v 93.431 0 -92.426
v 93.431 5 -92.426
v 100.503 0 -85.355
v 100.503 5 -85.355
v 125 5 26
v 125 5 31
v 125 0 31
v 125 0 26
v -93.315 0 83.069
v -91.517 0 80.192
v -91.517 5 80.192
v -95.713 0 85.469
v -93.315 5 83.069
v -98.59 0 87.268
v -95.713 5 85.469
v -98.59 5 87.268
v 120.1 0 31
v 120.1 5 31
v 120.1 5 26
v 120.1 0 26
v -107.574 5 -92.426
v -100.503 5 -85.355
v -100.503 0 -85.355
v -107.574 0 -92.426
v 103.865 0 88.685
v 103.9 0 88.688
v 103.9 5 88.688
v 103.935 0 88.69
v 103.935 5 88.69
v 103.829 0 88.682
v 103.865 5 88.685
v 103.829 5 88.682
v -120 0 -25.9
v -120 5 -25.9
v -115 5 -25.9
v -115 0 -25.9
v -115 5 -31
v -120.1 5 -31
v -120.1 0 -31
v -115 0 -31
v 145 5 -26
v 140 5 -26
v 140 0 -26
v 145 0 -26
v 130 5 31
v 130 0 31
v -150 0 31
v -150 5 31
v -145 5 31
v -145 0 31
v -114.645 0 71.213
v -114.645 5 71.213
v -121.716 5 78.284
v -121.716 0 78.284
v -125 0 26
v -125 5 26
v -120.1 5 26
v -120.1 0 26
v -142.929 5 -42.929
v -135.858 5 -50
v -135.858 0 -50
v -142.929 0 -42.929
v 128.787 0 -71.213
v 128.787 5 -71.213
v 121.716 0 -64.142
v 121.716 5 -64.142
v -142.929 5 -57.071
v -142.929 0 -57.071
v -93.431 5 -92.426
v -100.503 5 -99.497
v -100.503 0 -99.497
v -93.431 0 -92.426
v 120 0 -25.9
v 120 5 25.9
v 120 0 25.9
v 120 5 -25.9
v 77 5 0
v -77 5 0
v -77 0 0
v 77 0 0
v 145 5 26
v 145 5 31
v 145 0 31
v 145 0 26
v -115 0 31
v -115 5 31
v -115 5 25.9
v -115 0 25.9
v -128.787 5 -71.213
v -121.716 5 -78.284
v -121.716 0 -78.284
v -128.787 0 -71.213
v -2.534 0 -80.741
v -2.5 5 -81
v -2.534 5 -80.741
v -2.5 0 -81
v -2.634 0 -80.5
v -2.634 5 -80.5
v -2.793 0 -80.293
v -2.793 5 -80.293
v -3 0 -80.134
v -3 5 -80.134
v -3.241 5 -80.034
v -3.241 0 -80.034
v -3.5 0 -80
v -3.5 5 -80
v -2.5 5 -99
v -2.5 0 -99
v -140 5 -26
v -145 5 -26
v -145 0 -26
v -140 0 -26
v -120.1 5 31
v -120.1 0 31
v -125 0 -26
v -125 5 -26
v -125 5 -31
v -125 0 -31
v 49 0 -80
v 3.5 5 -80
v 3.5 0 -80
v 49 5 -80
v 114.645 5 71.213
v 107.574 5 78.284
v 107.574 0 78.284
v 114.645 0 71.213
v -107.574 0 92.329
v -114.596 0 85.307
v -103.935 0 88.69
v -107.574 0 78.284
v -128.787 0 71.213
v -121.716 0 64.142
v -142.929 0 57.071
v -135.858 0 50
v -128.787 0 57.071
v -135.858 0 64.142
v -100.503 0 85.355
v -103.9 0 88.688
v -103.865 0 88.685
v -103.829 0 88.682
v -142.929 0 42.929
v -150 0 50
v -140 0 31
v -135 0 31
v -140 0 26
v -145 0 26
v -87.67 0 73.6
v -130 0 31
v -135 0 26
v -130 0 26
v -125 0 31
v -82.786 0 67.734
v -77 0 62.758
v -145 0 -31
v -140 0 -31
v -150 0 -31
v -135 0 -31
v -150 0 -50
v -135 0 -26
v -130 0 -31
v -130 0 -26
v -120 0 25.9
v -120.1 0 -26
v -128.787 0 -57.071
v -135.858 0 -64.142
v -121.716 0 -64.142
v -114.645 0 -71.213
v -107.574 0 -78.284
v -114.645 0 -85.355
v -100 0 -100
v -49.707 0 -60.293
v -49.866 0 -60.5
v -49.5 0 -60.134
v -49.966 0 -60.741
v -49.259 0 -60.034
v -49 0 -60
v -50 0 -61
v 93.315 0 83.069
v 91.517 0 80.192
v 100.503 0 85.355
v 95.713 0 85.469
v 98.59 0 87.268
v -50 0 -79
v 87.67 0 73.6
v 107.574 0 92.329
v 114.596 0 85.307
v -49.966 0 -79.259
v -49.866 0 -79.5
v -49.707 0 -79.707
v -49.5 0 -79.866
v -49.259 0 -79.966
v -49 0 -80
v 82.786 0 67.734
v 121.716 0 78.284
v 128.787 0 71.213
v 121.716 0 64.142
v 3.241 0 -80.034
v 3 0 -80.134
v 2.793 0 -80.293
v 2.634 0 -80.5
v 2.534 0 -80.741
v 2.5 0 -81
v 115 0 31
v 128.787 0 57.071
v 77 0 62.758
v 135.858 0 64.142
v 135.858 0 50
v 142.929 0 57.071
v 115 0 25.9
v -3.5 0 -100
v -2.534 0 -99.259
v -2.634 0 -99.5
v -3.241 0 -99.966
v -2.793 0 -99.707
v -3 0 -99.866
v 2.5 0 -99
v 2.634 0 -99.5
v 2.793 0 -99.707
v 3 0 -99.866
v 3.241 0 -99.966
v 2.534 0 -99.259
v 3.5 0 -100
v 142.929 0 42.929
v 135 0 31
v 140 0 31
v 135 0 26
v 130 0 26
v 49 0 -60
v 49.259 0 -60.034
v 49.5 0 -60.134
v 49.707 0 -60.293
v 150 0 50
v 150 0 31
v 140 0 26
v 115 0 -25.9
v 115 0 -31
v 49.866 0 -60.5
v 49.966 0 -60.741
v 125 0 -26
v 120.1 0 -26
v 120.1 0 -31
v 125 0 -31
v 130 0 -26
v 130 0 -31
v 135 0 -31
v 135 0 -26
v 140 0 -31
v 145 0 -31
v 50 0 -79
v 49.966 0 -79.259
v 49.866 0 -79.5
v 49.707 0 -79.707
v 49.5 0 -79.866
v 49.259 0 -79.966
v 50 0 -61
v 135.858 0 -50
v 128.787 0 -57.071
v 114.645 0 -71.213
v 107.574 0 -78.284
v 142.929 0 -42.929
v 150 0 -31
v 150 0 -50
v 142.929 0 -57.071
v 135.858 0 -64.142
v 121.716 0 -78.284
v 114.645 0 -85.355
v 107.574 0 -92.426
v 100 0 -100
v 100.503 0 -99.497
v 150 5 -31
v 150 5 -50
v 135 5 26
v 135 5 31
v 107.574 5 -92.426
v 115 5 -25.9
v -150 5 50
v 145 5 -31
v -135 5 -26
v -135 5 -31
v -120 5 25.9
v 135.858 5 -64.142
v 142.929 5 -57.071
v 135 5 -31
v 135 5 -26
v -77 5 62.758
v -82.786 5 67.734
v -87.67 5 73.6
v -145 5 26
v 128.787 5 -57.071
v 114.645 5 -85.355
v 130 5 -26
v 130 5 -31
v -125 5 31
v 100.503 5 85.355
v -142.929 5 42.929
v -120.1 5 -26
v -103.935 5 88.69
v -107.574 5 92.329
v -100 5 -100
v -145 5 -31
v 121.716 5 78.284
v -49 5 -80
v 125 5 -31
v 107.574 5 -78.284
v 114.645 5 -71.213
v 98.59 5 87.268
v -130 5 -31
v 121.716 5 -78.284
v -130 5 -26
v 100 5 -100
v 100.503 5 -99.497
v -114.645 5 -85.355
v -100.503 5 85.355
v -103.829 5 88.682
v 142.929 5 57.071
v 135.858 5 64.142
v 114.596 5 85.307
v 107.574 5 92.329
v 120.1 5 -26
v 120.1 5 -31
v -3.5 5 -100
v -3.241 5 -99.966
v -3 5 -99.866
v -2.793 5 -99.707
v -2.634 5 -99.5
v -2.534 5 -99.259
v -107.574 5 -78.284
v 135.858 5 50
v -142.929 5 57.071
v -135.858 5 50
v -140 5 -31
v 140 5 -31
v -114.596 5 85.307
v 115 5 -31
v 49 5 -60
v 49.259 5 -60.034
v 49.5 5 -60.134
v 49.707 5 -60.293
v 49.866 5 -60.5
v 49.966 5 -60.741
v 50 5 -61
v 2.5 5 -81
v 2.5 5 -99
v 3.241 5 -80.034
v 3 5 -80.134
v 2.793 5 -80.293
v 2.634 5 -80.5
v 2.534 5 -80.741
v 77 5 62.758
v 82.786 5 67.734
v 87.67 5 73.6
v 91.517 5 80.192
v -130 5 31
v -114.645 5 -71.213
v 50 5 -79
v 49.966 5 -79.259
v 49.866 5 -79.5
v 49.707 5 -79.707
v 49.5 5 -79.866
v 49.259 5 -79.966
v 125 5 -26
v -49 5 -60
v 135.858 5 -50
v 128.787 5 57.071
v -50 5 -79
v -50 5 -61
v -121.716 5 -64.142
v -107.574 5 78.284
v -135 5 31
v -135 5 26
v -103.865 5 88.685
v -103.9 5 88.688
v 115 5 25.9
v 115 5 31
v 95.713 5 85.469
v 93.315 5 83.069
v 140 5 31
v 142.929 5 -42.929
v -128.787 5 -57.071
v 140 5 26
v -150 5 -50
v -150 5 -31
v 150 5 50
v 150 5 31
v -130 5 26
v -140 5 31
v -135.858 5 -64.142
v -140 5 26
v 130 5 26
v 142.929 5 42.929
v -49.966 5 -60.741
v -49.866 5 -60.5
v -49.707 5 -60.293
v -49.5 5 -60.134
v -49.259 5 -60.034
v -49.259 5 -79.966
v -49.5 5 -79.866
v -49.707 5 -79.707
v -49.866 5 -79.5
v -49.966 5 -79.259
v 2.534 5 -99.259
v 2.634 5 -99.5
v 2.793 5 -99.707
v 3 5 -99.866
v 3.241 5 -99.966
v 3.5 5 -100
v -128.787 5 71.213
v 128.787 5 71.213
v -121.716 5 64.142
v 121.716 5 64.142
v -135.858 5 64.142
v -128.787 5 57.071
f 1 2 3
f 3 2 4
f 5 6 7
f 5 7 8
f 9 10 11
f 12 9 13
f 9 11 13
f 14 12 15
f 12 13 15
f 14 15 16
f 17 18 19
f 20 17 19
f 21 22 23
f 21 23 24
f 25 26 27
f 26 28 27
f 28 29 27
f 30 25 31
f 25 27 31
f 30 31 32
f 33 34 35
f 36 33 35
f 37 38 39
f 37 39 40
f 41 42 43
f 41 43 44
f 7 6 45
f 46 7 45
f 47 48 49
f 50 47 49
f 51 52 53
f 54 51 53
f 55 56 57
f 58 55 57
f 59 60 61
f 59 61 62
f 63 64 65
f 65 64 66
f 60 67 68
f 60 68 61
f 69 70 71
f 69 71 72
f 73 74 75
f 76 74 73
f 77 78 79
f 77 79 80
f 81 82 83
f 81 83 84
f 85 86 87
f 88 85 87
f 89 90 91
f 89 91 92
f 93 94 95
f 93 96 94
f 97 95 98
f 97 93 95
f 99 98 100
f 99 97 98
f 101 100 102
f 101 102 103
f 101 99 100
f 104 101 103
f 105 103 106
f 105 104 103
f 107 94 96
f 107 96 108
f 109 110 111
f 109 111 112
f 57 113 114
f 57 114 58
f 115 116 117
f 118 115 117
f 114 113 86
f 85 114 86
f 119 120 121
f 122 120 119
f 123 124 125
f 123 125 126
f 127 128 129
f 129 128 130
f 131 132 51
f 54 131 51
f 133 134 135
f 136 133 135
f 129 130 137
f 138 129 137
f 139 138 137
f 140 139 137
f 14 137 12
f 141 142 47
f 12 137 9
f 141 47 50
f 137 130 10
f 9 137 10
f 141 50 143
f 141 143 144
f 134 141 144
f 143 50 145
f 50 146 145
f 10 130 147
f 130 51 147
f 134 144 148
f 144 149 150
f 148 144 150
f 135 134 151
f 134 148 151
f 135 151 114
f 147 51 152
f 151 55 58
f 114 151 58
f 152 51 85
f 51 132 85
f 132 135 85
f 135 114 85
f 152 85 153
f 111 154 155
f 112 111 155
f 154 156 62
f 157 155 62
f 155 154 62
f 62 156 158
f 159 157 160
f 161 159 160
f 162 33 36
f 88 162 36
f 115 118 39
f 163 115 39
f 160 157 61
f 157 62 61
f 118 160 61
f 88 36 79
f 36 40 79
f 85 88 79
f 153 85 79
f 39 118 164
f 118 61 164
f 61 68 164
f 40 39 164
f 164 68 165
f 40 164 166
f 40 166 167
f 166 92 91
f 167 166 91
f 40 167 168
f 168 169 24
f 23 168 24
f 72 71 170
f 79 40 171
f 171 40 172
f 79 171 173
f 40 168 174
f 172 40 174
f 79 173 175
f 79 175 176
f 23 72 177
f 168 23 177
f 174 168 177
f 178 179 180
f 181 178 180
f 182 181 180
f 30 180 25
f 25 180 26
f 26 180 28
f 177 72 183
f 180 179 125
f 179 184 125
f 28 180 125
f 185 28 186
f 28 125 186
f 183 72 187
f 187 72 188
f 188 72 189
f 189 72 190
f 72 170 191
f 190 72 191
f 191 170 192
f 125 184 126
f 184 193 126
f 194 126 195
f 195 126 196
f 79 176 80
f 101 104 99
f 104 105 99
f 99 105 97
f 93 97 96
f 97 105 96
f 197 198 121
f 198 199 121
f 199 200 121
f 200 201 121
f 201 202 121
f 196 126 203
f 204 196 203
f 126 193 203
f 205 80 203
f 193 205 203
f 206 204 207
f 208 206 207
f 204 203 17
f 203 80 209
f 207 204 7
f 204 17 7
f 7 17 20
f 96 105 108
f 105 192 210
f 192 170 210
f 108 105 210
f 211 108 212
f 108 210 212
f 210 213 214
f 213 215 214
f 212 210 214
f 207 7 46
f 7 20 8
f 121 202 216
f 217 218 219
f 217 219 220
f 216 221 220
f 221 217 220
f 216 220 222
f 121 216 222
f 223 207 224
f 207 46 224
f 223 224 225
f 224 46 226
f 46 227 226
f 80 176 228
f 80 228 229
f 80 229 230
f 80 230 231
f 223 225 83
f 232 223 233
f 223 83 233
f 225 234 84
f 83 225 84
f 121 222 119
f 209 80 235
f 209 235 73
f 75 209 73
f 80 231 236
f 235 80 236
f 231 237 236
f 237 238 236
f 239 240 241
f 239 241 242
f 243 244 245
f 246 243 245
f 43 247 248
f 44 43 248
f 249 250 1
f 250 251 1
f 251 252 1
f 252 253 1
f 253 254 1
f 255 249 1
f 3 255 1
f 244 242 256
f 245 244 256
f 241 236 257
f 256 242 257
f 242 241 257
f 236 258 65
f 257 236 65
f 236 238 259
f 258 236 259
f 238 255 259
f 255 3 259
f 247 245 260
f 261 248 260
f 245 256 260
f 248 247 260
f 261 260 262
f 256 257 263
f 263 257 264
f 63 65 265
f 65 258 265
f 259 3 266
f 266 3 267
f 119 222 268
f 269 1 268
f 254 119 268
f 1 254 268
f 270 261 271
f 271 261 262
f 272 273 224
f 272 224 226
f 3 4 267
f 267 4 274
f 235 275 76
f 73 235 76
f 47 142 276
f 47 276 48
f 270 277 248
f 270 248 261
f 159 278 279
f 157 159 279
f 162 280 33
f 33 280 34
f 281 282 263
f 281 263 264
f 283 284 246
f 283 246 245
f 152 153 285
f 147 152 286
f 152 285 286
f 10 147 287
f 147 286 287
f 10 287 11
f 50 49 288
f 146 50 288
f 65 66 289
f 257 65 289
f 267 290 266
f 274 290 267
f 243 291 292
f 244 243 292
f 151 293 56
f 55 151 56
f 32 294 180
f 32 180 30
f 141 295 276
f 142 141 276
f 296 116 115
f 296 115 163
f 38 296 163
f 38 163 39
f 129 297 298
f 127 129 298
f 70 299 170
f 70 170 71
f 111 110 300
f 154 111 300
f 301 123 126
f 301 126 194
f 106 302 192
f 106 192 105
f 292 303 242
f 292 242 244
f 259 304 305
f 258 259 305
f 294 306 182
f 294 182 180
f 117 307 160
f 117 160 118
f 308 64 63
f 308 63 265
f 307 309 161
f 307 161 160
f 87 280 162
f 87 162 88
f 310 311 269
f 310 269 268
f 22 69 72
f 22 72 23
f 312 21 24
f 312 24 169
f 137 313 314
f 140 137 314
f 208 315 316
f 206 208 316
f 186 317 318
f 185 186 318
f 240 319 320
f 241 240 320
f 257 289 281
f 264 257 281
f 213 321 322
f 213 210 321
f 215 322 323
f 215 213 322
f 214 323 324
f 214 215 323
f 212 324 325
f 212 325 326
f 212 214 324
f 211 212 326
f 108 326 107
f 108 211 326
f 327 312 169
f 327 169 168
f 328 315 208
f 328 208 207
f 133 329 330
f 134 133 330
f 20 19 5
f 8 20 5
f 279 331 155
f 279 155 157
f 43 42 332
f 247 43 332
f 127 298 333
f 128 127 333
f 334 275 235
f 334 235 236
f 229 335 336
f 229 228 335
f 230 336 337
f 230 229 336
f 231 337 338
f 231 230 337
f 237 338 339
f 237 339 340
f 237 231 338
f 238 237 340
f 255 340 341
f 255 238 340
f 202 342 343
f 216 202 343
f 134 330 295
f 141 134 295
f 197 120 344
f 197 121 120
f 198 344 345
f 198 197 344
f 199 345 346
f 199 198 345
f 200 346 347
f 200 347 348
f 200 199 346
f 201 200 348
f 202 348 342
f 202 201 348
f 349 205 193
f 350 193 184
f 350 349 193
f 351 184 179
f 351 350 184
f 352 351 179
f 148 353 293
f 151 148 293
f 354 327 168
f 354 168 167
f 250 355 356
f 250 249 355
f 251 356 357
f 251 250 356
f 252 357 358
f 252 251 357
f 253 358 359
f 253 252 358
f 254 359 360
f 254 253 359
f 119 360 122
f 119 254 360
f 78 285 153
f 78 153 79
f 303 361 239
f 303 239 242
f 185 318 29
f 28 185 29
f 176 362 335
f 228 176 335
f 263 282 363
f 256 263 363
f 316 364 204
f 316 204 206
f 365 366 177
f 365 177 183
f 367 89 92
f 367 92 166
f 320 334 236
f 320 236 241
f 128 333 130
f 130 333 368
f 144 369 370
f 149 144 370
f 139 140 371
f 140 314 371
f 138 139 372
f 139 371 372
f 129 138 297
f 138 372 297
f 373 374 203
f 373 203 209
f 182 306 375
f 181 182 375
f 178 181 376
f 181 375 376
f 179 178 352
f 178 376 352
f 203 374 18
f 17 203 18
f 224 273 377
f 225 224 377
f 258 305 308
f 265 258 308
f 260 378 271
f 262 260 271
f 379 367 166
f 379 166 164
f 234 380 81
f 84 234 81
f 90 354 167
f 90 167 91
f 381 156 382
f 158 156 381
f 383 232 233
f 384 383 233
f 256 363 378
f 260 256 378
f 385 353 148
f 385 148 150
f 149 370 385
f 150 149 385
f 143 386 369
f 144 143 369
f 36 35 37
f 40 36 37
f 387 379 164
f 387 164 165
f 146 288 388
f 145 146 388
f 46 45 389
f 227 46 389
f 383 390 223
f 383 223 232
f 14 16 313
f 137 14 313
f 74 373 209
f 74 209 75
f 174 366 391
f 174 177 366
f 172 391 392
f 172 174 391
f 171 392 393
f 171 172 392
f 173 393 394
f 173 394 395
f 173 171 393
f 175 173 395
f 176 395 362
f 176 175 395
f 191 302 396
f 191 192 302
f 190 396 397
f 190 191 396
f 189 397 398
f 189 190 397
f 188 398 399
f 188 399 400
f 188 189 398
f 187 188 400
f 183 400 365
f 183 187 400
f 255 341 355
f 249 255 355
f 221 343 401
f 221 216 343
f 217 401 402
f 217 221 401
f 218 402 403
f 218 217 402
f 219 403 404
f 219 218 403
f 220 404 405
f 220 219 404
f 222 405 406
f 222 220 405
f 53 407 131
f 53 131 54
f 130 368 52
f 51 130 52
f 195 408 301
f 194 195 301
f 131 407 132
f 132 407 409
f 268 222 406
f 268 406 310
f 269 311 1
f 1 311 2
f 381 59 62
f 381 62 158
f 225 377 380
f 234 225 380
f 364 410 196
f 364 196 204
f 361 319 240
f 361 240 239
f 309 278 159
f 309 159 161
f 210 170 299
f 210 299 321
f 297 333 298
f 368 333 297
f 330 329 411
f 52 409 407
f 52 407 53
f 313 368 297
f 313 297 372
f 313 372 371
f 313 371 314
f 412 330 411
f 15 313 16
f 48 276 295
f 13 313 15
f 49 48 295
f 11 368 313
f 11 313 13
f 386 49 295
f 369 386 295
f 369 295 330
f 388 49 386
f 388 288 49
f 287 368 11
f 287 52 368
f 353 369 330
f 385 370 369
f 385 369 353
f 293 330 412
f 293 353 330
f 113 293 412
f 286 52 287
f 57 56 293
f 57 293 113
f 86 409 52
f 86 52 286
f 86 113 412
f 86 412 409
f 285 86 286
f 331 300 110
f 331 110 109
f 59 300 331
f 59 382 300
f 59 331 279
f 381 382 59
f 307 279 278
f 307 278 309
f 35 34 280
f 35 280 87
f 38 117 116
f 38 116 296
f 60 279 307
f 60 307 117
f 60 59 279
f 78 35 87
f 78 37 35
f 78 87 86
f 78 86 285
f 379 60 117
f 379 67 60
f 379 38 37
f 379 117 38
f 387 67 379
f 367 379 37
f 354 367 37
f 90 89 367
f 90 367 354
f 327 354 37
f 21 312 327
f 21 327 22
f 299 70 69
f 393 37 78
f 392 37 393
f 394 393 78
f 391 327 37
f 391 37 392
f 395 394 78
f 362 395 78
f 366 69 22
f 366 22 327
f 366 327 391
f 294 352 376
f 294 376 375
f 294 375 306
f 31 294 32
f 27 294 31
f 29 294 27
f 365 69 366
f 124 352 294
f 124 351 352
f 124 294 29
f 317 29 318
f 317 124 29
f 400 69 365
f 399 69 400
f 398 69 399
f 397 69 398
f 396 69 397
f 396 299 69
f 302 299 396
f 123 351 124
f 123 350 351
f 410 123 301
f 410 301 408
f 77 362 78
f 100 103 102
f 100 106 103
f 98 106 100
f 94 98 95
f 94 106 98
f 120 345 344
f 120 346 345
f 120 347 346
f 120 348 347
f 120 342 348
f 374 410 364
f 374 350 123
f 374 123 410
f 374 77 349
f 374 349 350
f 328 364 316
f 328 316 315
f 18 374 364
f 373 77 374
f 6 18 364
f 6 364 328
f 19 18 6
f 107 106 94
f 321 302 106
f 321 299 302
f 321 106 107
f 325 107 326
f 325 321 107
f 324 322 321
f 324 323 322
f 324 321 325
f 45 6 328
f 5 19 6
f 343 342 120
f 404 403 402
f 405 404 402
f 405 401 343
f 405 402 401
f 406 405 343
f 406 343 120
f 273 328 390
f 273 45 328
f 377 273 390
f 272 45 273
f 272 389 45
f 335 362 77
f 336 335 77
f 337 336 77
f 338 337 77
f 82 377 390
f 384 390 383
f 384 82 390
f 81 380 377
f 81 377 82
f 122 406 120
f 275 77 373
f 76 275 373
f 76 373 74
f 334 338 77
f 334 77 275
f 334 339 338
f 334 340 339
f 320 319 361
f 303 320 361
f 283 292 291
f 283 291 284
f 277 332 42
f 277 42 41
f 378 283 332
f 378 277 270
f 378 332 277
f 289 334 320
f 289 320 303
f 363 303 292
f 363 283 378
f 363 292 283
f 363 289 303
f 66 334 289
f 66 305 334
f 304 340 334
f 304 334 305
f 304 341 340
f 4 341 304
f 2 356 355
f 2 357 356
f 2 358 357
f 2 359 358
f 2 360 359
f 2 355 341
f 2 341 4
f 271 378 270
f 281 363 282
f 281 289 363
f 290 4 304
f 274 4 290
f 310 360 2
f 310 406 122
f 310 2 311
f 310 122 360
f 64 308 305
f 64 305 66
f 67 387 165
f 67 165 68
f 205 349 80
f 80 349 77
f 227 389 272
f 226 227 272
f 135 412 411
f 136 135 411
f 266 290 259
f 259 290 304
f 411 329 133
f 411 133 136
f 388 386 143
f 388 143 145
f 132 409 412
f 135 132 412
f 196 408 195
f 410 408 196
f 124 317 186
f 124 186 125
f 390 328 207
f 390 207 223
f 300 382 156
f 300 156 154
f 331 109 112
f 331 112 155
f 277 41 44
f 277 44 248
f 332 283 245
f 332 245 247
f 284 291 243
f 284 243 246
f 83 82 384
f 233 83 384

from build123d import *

# Parameters (mm, degrees)
ESQUISSE1_W                = 300
ESQUISSE1_H                = 200
BOSS_EXTRU_1_DEPTH         = 5
ENL_V_MAT_EXTRU_1_DEPTH    = 10
ESQUISSE10_R               = 46
ENL_V_MAT_EXTRU_9_DEPTH    = 10
CONG_2_R                   = 15
CONG_3_R                   = 15
ENL_V_MAT_EXTRU_10_DEPTH   = 10
R_P_TITION_LIN_AIRE1_COUNT = 4
R_P_TITION_LIN_AIRE1_PITCH = 20
SYM_TRIE3_COPY_1_DEPTH     = 10
SYM_TRIE3_COPY_2_DEPTH     = 10
SYM_TRIE3_COPY_3_DEPTH     = 10
SYM_TRIE4_COPY_1_DEPTH     = 10
SYM_TRIE4_COPY_2_DEPTH     = 10
SYM_TRIE4_COPY_3_DEPTH     = 10
SYM_TRIE4_COPY_4_DEPTH     = 10
SYM_TRIE4_COPY_5_DEPTH     = 10
SYM_TRIE4_COPY_6_DEPTH     = 10
SYM_TRIE4_COPY_7_DEPTH     = 10
ESQUISSE16_W               = 154
ESQUISSE16_H               = 100
ENL_V_MAT_EXTRU_15_DEPTH   = 10
ESQUISSE24_W               = 30
ESQUISSE24_H               = 52
ENL_V_MAT_EXTRU_18_DEPTH   = 10
ESQUISSE25_W               = 5.1
ESQUISSE25_H               = 5.1
ESQUISSE25_W_2             = 5
ENL_V_MAT_EXTRU_21_DEPTH   = 10
ESQUISSE26_W               = 100
ESQUISSE26_H               = 20
ENL_V_MAT_EXTRU_22_DEPTH   = 10
ESQUISSE27_W               = 5
ESQUISSE27_H               = 20
ENL_V_MAT_EXTRU_23_DEPTH   = 10
CONG_4_R                   = 1
BOSS_EXTRU_2_DEPTH         = 5


with BuildPart() as part:
    # Esquisse1 → Boss.-Extru.1 (new body)
    with BuildSketch(Plane(origin=(0, 0, 0), x_dir=(1, 0, 0), z_dir=(0, 1, 0))):
        Rectangle(ESQUISSE1_W, ESQUISSE1_H)
    extrude(amount=BOSS_EXTRU_1_DEPTH)

    # Esquisse2 → Enlèv. mat.-Extru.1 (cut)
    with BuildSketch(Plane(origin=(0, 5, 0), x_dir=(1, 0, 0), z_dir=(0, 1, 0))):
        Polygon((-100, 100), (-150, 50), (-150, 100), align=None)
        Polygon((150, 100), (150, 50), (100, 100), align=None)
        Polygon((150, -100), (150, -50), (100, -100), align=None)
        Polygon((-100, -100), (-150, -100), (-150, -50), align=None)
    extrude(amount=-ENL_V_MAT_EXTRU_1_DEPTH, mode=Mode.SUBTRACT)

    # Esquisse10 → Enlèv. mat.-Extru.9 (cut)
    with BuildSketch(Plane(origin=(0, 5, 0), x_dir=(1, 0, 0), z_dir=(0, 1, 0))):
        with Locations((-50, -100)):
            Circle(ESQUISSE10_R)
    enl_v_mat_extru_9 = extrude(amount=-ENL_V_MAT_EXTRU_9_DEPTH, mode=Mode.SUBTRACT)

    # Symétrie2: Enlèv. mat.-Extru.9 across plane
    add(enl_v_mat_extru_9.mirror(Plane(origin=(0, 0, 0), x_dir=(0, 0, 1), z_dir=(1, 0, 0))), mode=Mode.SUBTRACT)

    # Congé2
    # the kernel refuses this fillet: 15 mm, written as the material it takes off along each edge
    with BuildSketch(Plane(origin=(96, -21.235602644, 100), x_dir=(-0.09232870714969725, 0, -0.9957285824139354), z_dir=(0, 1, 0))) as cong_2_piece_1:
        with BuildLine():
            CenterArc((9.879171665, -14.935928736), CONG_2_R, 95.297590138, 37.799165941)
            Line((-0.369314829, -3.98291433), (-0.574284558, -3.763854042))
            ThreePointArc((-0.574284558, -3.763854042), (-0.483375989, -1.963758553), (-0.298718575, 0.027698612))
            Line((-0.298718575, 0.027698612), (0.027698612, 0.298718575))
            ThreePointArc((0.027698612, 0.298718575), (4.247120529, 0.103514791), (8.466542446, 0.298718575))
            Line((8.466542446, 0.298718575), (8.494241058, 0))
        make_face()
    extrude(amount=47.471205289, mode=Mode.SUBTRACT)
    with BuildSketch(Plane(origin=(-4, 31.582289094, 100), x_dir=(-0.11557516997606784, 0, -0.9932987365767678), z_dir=(0, -1, 0))) as cong_2_piece_2:
        with BuildLine():
            CenterArc((12.366543187, 14.899481049), CONG_2_R, 207.615736088, 55.747462838)
            Line((-0.92460136, 7.946389893), (-1.190424251, 7.807328069))
            ThreePointArc((-1.190424251, 7.807328069), (-0.760290301, 3.938522395), (-0.297989621, -0.034672551))
            Line((-0.297989621, -0.034672551), (0.034672551, -0.297989621))
            ThreePointArc((0.034672551, -0.297989621), (5.316457819, 0.008258117), (10.598243087, -0.297989621))
            Line((10.598243087, -0.297989621), (10.632915638, 0))
        make_face()
    extrude(amount=58.164578189, mode=Mode.SUBTRACT)
    with BuildSketch(Plane(origin=(-96, -21.235602644, 100), x_dir=(-1, 0, 0), z_dir=(0, 1, 0))) as cong_2_piece_3:
        with BuildLine():
            CenterArc((13.96, -11.215988588), CONG_2_R, 131.605653784, 37.799165941)
            Line((-0.784262295, -8.457958607), (-1.079147541, -8.402798008))
            ThreePointArc((-1.079147541, -8.402798008), (-0.495203784, -4.219421917), (-0.3, 0))
            Line((-0.3, 0), (0, 0.3))
            ThreePointArc((0, 0.3), (2, 0.3), (3.8008, 0.224319772))
            Line((3.8008, 0.224319772), (4, 0))
        make_face()
    extrude(amount=47.471205289, mode=Mode.SUBTRACT)

    # Congé3
    # the kernel refuses this fillet: 15 mm, written as the material it takes off along each edge
    with BuildSketch(Plane(origin=(4, 82.454375783, 100), x_dir=(-0.5259574363156356, 0, -0.8505108906911681), z_dir=(0, -1, 0))) as cong_3_piece_1:
        with BuildLine():
            CenterArc((31.823070558, 14.976387423), CONG_3_R, 156.680733503, 110.10397256)
            Line((18.048370731, 20.91420223), (16.670900749, 21.507983711))
            ThreePointArc((16.670900749, 21.507983711), (9.495651399, 10.050239134), (-0.788936154, 1.275766336))
            Line((-0.788936154, 1.275766336), (-0.908739865, -1.193395097))
            ThreePointArc((-0.908739865, -1.193395097), (14.311759275, -3.717121073), (30.897618289, -1.497638742))
            Line((30.897618289, -1.497638742), (30.981750313, 0))
        make_face()
    extrude(amount=159.908751565, mode=Mode.SUBTRACT)
    with BuildSketch(Plane(origin=(100, 60.370568853, 100), x_dir=(-0.393687931749037, 0, -0.9192441527663723), z_dir=(0, -1, 0))) as cong_3_piece_2:
        with BuildLine():
            CenterArc((22.15656876, 14.987676404), CONG_3_R, 158.18416882, 109.493145359)
            Line((8.230821057, 20.56204192), (6.838246287, 21.119478472))
            Line((6.838246287, 21.119478472), (-1.39257477, 0.557436552))
            Line((-1.39257477, 0.557436552), (-0.638910013, -1.357127111))
            ThreePointArc((-0.638910013, -1.357127111), (9.985368841, -2.532046911), (21.487866451, -1.49876764))
            Line((21.487866451, -1.49876764), (21.54865757, 0))
        make_face()
    extrude(amount=115.741137706, mode=Mode.SUBTRACT)
    with BuildSketch(Plane(origin=(-100, 60.370568853, 100), x_dir=(-0.7071067811865478, 0, -0.7071067811865471), z_dir=(0, -1, 0))) as cong_3_piece_3:
        with BuildLine():
            CenterArc((22.148227541, 15), CONG_3_R, 160.506854641, 109.493145359)
            Line((8.008006246, 20.005411244), (6.593984116, 20.505952369))
            ThreePointArc((6.593984116, 20.505952369), (1.360096619, 10.211218813), (-1.497368513, -0.088811805))
            Line((-1.497368513, -0.088811805), (0, -1.5))
            Line((0, -1.5), (22.148227541, -1.5))
            Line((22.148227541, -1.5), (22.148227541, 0))
        make_face()
    extrude(amount=115.741137706, mode=Mode.SUBTRACT)

    # Esquisse11 → Enlèv. mat.-Extru.10 (cut)
    with BuildSketch(Plane(origin=(0, 5, 0), x_dir=(1, 0, 0), z_dir=(0, 1, 0))):
        Polygon((-150, 50), (-142.928932188, 57.071067812), (-135.857864376, 50), (-142.928932188, 42.928932188), align=None)
    enl_v_mat_extru_10 = extrude(amount=-ENL_V_MAT_EXTRU_10_DEPTH, mode=Mode.SUBTRACT)

    # Répétition linéaire1: Enlèv. mat.-Extru.10 ×4
    with Locations(*[Vector(0.7071067811865476, 0, -0.7071067811865476) * (i * R_P_TITION_LIN_AIRE1_PITCH) for i in range(1, R_P_TITION_LIN_AIRE1_COUNT)]):
        add(enl_v_mat_extru_10, mode=Mode.SUBTRACT)

    # Symétrie3: Enlèv. mat.-Extru.10 across plane
    add(enl_v_mat_extru_10.mirror(Plane.XY), mode=Mode.SUBTRACT)

    # Symétrie3 copy 1 sketch → Symétrie3 copy 1 (cut)
    with BuildSketch(Plane(origin=(14.142135624, 5, 14.142135624), x_dir=(1, 0, 0), z_dir=(0, 1, 0))):
        Polygon((-150, -50), (-142.928932188, -57.071067812), (-135.857864376, -50), (-142.928932188, -42.928932188), align=None)
    extrude(amount=-SYM_TRIE3_COPY_1_DEPTH, mode=Mode.SUBTRACT)

    # Symétrie3 copy 2 sketch → Symétrie3 copy 2 (cut)
    with BuildSketch(Plane(origin=(28.284271247, 5, 28.284271247), x_dir=(1, 0, 0), z_dir=(0, 1, 0))):
        Polygon((-150, -50), (-142.928932188, -57.071067812), (-135.857864376, -50), (-142.928932188, -42.928932188), align=None)
    extrude(amount=-SYM_TRIE3_COPY_2_DEPTH, mode=Mode.SUBTRACT)

    # Symétrie3 copy 3 sketch → Symétrie3 copy 3 (cut)
    with BuildSketch(Plane(origin=(42.426406871, 5, 42.426406871), x_dir=(1, 0, 0), z_dir=(0, 1, 0))):
        Polygon((-150, -50), (-142.928932188, -57.071067812), (-135.857864376, -50), (-142.928932188, -42.928932188), align=None)
    extrude(amount=-SYM_TRIE3_COPY_3_DEPTH, mode=Mode.SUBTRACT)

    # Symétrie4: Enlèv. mat.-Extru.10 across plane
    add(enl_v_mat_extru_10.mirror(Plane(origin=(0, 0, 0), x_dir=(0, 0, 1), z_dir=(1, 0, 0))), mode=Mode.SUBTRACT)

    # Symétrie4 copy 1 sketch → Symétrie4 copy 1 (cut)
    with BuildSketch(Plane(origin=(-14.142135624, 5, -14.142135624), x_dir=(-1, 0, 0), z_dir=(0, 1, 0))):
        Polygon((-150, -50), (-142.928932188, -57.071067812), (-135.857864376, -50), (-142.928932188, -42.928932188), align=None)
    extrude(amount=-SYM_TRIE4_COPY_1_DEPTH, mode=Mode.SUBTRACT)

    # Symétrie4 copy 2 sketch → Symétrie4 copy 2 (cut)
    with BuildSketch(Plane(origin=(-28.284271247, 5, -28.284271247), x_dir=(-1, 0, 0), z_dir=(0, 1, 0))):
        Polygon((-150, -50), (-142.928932188, -57.071067812), (-135.857864376, -50), (-142.928932188, -42.928932188), align=None)
    extrude(amount=-SYM_TRIE4_COPY_2_DEPTH, mode=Mode.SUBTRACT)

    # Symétrie4 copy 3 sketch → Symétrie4 copy 3 (cut)
    with BuildSketch(Plane(origin=(-42.426406871, 5, -42.426406871), x_dir=(-1, 0, 0), z_dir=(0, 1, 0))):
        Polygon((-150, -50), (-142.928932188, -57.071067812), (-135.857864376, -50), (-142.928932188, -42.928932188), align=None)
    extrude(amount=-SYM_TRIE4_COPY_3_DEPTH, mode=Mode.SUBTRACT)

    # Symétrie4 copy 4 sketch → Symétrie4 copy 4 (cut)
    with BuildSketch(Plane(origin=(0, 5, 0), x_dir=(-1, 0, 0), z_dir=(0, 1, 0))):
        Polygon((-150, 50), (-142.928932188, 57.071067812), (-135.857864376, 50), (-142.928932188, 42.928932188), align=None)
    extrude(amount=-SYM_TRIE4_COPY_4_DEPTH, mode=Mode.SUBTRACT)

    # Symétrie4 copy 5 sketch → Symétrie4 copy 5 (cut)
    with BuildSketch(Plane(origin=(-14.142135624, 5, 14.142135624), x_dir=(-1, 0, 0), z_dir=(0, 1, 0))):
        Polygon((-150, 50), (-142.928932188, 57.071067812), (-135.857864376, 50), (-142.928932188, 42.928932188), align=None)
    extrude(amount=-SYM_TRIE4_COPY_5_DEPTH, mode=Mode.SUBTRACT)

    # Symétrie4 copy 6 sketch → Symétrie4 copy 6 (cut)
    with BuildSketch(Plane(origin=(-28.284271247, 5, 28.284271247), x_dir=(-1, 0, 0), z_dir=(0, 1, 0))):
        Polygon((-150, 50), (-142.928932188, 57.071067812), (-135.857864376, 50), (-142.928932188, 42.928932188), align=None)
    extrude(amount=-SYM_TRIE4_COPY_6_DEPTH, mode=Mode.SUBTRACT)

    # Symétrie4 copy 7 sketch → Symétrie4 copy 7 (cut)
    with BuildSketch(Plane(origin=(-42.426406871, 5, 42.426406871), x_dir=(-1, 0, 0), z_dir=(0, 1, 0))):
        Polygon((-150, 50), (-142.928932188, 57.071067812), (-135.857864376, 50), (-142.928932188, 42.928932188), align=None)
    extrude(amount=-SYM_TRIE4_COPY_7_DEPTH, mode=Mode.SUBTRACT)

    # Esquisse16 → Enlèv. mat.-Extru.15 (cut)
    with BuildSketch(Plane(origin=(0, 5, 0), x_dir=(1, 0, 0), z_dir=(0, 1, 0))):
        with Locations((0, -50)):
            Rectangle(ESQUISSE16_W, ESQUISSE16_H)
    extrude(amount=-ENL_V_MAT_EXTRU_15_DEPTH, mode=Mode.SUBTRACT)

    # Esquisse24 → Enlèv. mat.-Extru.18 (cut)
    with BuildSketch(Plane(origin=(0, 5, 0), x_dir=(1, 0, 0), z_dir=(0, 1, 0))):
        with Locations((-135, 0)):
            Rectangle(ESQUISSE24_W, ESQUISSE24_H)
        with Locations((135, 0)):
            Rectangle(ESQUISSE24_W, ESQUISSE24_H)
    extrude(amount=-ENL_V_MAT_EXTRU_18_DEPTH, mode=Mode.SUBTRACT)

    # Esquisse25 → Enlèv. mat.-Extru.21 (cut)
    with BuildSketch(Plane(origin=(0, 5, 0), x_dir=(1, 0, 0), z_dir=(0, 1, 0))):
        with Locations((-147.55, 28.45)):
            Rectangle(ESQUISSE25_W, ESQUISSE25_H)
        with Locations((-127.5, 28.45)):
            Rectangle(ESQUISSE25_W_2, ESQUISSE25_H)
        with Locations((-137.5, 28.45)):
            Rectangle(ESQUISSE25_W_2, ESQUISSE25_H)
        with Locations((-117.55, 28.45)):
            Rectangle(ESQUISSE25_W, ESQUISSE25_H)
        with Locations((-117.55, -28.45)):
            Rectangle(ESQUISSE25_W, ESQUISSE25_H)
        with Locations((-127.5, -28.45)):
            Rectangle(ESQUISSE25_W_2, ESQUISSE25_H)
        with Locations((-137.5, -28.45)):
            Rectangle(ESQUISSE25_W_2, ESQUISSE25_H)
        with Locations((-147.55, -28.45)):
            Rectangle(ESQUISSE25_W, ESQUISSE25_H)
        with Locations((147.55, -28.45)):
            Rectangle(ESQUISSE25_W, ESQUISSE25_H)
        with Locations((127.5, -28.45)):
            Rectangle(ESQUISSE25_W_2, ESQUISSE25_H)
        with Locations((137.5, -28.45)):
            Rectangle(ESQUISSE25_W_2, ESQUISSE25_H)
        with Locations((117.55, -28.45)):
            Rectangle(ESQUISSE25_W, ESQUISSE25_H)
        with Locations((117.55, 28.45)):
            Rectangle(ESQUISSE25_W, ESQUISSE25_H)
        with Locations((127.5, 28.45)):
            Rectangle(ESQUISSE25_W_2, ESQUISSE25_H)
        with Locations((137.5, 28.45)):
            Rectangle(ESQUISSE25_W_2, ESQUISSE25_H)
        with Locations((147.55, 28.45)):
            Rectangle(ESQUISSE25_W, ESQUISSE25_H)
    extrude(amount=-ENL_V_MAT_EXTRU_21_DEPTH, mode=Mode.SUBTRACT)

    # Esquisse26 → Enlèv. mat.-Extru.22 (cut)
    with BuildSketch(Plane(origin=(0, 5, 0), x_dir=(1, 0, 0), z_dir=(0, 1, 0))):
        with Locations((0, 70)):
            Rectangle(ESQUISSE26_W, ESQUISSE26_H)
    extrude(amount=-ENL_V_MAT_EXTRU_22_DEPTH, mode=Mode.SUBTRACT)

    # Esquisse27 → Enlèv. mat.-Extru.23 (cut)
    with BuildSketch(Plane(origin=(0, 5, 0), x_dir=(1, 0, 0), z_dir=(0, 1, 0))):
        with Locations((0, 90)):
            Rectangle(ESQUISSE27_W, ESQUISSE27_H)
    extrude(amount=-ENL_V_MAT_EXTRU_23_DEPTH, mode=Mode.SUBTRACT)

    # Congé4
    cong_4_edges = [part.edges().sort_by_distance(p)[0] for p in [
        (-50, 2.5, -60),
        (-50, 2.5, -80),
        (50, 2.5, -80),
        (50, 2.5, -60),
        (-2.5, 2.5, -80),
        (2.5, 2.5, -80),
        (-2.5, 2.5, -100),
        (2.5, 2.5, -100),
    ]]
    fillet(cong_4_edges, radius=CONG_4_R)

    # Esquisse28 → Boss.-Extru.2 (add)
    with BuildSketch(Plane(origin=(0, 5, 0), x_dir=(1, 0, 0), z_dir=(0, 1, 0))):
        Polygon((107.573593129, -78.284271247), (114.595839569, -85.306517687), (107.573593129, -92.328764127), (100.551346689, -85.306517687), align=None)
        Polygon((-107.573593129, -92.328764127), (-114.595839569, -85.306517687), (-107.573593129, -78.284271247), (-100.551346689, -85.306517687), align=None)
    extrude(amount=-BOSS_EXTRU_2_DEPTH)


solid = part.part
